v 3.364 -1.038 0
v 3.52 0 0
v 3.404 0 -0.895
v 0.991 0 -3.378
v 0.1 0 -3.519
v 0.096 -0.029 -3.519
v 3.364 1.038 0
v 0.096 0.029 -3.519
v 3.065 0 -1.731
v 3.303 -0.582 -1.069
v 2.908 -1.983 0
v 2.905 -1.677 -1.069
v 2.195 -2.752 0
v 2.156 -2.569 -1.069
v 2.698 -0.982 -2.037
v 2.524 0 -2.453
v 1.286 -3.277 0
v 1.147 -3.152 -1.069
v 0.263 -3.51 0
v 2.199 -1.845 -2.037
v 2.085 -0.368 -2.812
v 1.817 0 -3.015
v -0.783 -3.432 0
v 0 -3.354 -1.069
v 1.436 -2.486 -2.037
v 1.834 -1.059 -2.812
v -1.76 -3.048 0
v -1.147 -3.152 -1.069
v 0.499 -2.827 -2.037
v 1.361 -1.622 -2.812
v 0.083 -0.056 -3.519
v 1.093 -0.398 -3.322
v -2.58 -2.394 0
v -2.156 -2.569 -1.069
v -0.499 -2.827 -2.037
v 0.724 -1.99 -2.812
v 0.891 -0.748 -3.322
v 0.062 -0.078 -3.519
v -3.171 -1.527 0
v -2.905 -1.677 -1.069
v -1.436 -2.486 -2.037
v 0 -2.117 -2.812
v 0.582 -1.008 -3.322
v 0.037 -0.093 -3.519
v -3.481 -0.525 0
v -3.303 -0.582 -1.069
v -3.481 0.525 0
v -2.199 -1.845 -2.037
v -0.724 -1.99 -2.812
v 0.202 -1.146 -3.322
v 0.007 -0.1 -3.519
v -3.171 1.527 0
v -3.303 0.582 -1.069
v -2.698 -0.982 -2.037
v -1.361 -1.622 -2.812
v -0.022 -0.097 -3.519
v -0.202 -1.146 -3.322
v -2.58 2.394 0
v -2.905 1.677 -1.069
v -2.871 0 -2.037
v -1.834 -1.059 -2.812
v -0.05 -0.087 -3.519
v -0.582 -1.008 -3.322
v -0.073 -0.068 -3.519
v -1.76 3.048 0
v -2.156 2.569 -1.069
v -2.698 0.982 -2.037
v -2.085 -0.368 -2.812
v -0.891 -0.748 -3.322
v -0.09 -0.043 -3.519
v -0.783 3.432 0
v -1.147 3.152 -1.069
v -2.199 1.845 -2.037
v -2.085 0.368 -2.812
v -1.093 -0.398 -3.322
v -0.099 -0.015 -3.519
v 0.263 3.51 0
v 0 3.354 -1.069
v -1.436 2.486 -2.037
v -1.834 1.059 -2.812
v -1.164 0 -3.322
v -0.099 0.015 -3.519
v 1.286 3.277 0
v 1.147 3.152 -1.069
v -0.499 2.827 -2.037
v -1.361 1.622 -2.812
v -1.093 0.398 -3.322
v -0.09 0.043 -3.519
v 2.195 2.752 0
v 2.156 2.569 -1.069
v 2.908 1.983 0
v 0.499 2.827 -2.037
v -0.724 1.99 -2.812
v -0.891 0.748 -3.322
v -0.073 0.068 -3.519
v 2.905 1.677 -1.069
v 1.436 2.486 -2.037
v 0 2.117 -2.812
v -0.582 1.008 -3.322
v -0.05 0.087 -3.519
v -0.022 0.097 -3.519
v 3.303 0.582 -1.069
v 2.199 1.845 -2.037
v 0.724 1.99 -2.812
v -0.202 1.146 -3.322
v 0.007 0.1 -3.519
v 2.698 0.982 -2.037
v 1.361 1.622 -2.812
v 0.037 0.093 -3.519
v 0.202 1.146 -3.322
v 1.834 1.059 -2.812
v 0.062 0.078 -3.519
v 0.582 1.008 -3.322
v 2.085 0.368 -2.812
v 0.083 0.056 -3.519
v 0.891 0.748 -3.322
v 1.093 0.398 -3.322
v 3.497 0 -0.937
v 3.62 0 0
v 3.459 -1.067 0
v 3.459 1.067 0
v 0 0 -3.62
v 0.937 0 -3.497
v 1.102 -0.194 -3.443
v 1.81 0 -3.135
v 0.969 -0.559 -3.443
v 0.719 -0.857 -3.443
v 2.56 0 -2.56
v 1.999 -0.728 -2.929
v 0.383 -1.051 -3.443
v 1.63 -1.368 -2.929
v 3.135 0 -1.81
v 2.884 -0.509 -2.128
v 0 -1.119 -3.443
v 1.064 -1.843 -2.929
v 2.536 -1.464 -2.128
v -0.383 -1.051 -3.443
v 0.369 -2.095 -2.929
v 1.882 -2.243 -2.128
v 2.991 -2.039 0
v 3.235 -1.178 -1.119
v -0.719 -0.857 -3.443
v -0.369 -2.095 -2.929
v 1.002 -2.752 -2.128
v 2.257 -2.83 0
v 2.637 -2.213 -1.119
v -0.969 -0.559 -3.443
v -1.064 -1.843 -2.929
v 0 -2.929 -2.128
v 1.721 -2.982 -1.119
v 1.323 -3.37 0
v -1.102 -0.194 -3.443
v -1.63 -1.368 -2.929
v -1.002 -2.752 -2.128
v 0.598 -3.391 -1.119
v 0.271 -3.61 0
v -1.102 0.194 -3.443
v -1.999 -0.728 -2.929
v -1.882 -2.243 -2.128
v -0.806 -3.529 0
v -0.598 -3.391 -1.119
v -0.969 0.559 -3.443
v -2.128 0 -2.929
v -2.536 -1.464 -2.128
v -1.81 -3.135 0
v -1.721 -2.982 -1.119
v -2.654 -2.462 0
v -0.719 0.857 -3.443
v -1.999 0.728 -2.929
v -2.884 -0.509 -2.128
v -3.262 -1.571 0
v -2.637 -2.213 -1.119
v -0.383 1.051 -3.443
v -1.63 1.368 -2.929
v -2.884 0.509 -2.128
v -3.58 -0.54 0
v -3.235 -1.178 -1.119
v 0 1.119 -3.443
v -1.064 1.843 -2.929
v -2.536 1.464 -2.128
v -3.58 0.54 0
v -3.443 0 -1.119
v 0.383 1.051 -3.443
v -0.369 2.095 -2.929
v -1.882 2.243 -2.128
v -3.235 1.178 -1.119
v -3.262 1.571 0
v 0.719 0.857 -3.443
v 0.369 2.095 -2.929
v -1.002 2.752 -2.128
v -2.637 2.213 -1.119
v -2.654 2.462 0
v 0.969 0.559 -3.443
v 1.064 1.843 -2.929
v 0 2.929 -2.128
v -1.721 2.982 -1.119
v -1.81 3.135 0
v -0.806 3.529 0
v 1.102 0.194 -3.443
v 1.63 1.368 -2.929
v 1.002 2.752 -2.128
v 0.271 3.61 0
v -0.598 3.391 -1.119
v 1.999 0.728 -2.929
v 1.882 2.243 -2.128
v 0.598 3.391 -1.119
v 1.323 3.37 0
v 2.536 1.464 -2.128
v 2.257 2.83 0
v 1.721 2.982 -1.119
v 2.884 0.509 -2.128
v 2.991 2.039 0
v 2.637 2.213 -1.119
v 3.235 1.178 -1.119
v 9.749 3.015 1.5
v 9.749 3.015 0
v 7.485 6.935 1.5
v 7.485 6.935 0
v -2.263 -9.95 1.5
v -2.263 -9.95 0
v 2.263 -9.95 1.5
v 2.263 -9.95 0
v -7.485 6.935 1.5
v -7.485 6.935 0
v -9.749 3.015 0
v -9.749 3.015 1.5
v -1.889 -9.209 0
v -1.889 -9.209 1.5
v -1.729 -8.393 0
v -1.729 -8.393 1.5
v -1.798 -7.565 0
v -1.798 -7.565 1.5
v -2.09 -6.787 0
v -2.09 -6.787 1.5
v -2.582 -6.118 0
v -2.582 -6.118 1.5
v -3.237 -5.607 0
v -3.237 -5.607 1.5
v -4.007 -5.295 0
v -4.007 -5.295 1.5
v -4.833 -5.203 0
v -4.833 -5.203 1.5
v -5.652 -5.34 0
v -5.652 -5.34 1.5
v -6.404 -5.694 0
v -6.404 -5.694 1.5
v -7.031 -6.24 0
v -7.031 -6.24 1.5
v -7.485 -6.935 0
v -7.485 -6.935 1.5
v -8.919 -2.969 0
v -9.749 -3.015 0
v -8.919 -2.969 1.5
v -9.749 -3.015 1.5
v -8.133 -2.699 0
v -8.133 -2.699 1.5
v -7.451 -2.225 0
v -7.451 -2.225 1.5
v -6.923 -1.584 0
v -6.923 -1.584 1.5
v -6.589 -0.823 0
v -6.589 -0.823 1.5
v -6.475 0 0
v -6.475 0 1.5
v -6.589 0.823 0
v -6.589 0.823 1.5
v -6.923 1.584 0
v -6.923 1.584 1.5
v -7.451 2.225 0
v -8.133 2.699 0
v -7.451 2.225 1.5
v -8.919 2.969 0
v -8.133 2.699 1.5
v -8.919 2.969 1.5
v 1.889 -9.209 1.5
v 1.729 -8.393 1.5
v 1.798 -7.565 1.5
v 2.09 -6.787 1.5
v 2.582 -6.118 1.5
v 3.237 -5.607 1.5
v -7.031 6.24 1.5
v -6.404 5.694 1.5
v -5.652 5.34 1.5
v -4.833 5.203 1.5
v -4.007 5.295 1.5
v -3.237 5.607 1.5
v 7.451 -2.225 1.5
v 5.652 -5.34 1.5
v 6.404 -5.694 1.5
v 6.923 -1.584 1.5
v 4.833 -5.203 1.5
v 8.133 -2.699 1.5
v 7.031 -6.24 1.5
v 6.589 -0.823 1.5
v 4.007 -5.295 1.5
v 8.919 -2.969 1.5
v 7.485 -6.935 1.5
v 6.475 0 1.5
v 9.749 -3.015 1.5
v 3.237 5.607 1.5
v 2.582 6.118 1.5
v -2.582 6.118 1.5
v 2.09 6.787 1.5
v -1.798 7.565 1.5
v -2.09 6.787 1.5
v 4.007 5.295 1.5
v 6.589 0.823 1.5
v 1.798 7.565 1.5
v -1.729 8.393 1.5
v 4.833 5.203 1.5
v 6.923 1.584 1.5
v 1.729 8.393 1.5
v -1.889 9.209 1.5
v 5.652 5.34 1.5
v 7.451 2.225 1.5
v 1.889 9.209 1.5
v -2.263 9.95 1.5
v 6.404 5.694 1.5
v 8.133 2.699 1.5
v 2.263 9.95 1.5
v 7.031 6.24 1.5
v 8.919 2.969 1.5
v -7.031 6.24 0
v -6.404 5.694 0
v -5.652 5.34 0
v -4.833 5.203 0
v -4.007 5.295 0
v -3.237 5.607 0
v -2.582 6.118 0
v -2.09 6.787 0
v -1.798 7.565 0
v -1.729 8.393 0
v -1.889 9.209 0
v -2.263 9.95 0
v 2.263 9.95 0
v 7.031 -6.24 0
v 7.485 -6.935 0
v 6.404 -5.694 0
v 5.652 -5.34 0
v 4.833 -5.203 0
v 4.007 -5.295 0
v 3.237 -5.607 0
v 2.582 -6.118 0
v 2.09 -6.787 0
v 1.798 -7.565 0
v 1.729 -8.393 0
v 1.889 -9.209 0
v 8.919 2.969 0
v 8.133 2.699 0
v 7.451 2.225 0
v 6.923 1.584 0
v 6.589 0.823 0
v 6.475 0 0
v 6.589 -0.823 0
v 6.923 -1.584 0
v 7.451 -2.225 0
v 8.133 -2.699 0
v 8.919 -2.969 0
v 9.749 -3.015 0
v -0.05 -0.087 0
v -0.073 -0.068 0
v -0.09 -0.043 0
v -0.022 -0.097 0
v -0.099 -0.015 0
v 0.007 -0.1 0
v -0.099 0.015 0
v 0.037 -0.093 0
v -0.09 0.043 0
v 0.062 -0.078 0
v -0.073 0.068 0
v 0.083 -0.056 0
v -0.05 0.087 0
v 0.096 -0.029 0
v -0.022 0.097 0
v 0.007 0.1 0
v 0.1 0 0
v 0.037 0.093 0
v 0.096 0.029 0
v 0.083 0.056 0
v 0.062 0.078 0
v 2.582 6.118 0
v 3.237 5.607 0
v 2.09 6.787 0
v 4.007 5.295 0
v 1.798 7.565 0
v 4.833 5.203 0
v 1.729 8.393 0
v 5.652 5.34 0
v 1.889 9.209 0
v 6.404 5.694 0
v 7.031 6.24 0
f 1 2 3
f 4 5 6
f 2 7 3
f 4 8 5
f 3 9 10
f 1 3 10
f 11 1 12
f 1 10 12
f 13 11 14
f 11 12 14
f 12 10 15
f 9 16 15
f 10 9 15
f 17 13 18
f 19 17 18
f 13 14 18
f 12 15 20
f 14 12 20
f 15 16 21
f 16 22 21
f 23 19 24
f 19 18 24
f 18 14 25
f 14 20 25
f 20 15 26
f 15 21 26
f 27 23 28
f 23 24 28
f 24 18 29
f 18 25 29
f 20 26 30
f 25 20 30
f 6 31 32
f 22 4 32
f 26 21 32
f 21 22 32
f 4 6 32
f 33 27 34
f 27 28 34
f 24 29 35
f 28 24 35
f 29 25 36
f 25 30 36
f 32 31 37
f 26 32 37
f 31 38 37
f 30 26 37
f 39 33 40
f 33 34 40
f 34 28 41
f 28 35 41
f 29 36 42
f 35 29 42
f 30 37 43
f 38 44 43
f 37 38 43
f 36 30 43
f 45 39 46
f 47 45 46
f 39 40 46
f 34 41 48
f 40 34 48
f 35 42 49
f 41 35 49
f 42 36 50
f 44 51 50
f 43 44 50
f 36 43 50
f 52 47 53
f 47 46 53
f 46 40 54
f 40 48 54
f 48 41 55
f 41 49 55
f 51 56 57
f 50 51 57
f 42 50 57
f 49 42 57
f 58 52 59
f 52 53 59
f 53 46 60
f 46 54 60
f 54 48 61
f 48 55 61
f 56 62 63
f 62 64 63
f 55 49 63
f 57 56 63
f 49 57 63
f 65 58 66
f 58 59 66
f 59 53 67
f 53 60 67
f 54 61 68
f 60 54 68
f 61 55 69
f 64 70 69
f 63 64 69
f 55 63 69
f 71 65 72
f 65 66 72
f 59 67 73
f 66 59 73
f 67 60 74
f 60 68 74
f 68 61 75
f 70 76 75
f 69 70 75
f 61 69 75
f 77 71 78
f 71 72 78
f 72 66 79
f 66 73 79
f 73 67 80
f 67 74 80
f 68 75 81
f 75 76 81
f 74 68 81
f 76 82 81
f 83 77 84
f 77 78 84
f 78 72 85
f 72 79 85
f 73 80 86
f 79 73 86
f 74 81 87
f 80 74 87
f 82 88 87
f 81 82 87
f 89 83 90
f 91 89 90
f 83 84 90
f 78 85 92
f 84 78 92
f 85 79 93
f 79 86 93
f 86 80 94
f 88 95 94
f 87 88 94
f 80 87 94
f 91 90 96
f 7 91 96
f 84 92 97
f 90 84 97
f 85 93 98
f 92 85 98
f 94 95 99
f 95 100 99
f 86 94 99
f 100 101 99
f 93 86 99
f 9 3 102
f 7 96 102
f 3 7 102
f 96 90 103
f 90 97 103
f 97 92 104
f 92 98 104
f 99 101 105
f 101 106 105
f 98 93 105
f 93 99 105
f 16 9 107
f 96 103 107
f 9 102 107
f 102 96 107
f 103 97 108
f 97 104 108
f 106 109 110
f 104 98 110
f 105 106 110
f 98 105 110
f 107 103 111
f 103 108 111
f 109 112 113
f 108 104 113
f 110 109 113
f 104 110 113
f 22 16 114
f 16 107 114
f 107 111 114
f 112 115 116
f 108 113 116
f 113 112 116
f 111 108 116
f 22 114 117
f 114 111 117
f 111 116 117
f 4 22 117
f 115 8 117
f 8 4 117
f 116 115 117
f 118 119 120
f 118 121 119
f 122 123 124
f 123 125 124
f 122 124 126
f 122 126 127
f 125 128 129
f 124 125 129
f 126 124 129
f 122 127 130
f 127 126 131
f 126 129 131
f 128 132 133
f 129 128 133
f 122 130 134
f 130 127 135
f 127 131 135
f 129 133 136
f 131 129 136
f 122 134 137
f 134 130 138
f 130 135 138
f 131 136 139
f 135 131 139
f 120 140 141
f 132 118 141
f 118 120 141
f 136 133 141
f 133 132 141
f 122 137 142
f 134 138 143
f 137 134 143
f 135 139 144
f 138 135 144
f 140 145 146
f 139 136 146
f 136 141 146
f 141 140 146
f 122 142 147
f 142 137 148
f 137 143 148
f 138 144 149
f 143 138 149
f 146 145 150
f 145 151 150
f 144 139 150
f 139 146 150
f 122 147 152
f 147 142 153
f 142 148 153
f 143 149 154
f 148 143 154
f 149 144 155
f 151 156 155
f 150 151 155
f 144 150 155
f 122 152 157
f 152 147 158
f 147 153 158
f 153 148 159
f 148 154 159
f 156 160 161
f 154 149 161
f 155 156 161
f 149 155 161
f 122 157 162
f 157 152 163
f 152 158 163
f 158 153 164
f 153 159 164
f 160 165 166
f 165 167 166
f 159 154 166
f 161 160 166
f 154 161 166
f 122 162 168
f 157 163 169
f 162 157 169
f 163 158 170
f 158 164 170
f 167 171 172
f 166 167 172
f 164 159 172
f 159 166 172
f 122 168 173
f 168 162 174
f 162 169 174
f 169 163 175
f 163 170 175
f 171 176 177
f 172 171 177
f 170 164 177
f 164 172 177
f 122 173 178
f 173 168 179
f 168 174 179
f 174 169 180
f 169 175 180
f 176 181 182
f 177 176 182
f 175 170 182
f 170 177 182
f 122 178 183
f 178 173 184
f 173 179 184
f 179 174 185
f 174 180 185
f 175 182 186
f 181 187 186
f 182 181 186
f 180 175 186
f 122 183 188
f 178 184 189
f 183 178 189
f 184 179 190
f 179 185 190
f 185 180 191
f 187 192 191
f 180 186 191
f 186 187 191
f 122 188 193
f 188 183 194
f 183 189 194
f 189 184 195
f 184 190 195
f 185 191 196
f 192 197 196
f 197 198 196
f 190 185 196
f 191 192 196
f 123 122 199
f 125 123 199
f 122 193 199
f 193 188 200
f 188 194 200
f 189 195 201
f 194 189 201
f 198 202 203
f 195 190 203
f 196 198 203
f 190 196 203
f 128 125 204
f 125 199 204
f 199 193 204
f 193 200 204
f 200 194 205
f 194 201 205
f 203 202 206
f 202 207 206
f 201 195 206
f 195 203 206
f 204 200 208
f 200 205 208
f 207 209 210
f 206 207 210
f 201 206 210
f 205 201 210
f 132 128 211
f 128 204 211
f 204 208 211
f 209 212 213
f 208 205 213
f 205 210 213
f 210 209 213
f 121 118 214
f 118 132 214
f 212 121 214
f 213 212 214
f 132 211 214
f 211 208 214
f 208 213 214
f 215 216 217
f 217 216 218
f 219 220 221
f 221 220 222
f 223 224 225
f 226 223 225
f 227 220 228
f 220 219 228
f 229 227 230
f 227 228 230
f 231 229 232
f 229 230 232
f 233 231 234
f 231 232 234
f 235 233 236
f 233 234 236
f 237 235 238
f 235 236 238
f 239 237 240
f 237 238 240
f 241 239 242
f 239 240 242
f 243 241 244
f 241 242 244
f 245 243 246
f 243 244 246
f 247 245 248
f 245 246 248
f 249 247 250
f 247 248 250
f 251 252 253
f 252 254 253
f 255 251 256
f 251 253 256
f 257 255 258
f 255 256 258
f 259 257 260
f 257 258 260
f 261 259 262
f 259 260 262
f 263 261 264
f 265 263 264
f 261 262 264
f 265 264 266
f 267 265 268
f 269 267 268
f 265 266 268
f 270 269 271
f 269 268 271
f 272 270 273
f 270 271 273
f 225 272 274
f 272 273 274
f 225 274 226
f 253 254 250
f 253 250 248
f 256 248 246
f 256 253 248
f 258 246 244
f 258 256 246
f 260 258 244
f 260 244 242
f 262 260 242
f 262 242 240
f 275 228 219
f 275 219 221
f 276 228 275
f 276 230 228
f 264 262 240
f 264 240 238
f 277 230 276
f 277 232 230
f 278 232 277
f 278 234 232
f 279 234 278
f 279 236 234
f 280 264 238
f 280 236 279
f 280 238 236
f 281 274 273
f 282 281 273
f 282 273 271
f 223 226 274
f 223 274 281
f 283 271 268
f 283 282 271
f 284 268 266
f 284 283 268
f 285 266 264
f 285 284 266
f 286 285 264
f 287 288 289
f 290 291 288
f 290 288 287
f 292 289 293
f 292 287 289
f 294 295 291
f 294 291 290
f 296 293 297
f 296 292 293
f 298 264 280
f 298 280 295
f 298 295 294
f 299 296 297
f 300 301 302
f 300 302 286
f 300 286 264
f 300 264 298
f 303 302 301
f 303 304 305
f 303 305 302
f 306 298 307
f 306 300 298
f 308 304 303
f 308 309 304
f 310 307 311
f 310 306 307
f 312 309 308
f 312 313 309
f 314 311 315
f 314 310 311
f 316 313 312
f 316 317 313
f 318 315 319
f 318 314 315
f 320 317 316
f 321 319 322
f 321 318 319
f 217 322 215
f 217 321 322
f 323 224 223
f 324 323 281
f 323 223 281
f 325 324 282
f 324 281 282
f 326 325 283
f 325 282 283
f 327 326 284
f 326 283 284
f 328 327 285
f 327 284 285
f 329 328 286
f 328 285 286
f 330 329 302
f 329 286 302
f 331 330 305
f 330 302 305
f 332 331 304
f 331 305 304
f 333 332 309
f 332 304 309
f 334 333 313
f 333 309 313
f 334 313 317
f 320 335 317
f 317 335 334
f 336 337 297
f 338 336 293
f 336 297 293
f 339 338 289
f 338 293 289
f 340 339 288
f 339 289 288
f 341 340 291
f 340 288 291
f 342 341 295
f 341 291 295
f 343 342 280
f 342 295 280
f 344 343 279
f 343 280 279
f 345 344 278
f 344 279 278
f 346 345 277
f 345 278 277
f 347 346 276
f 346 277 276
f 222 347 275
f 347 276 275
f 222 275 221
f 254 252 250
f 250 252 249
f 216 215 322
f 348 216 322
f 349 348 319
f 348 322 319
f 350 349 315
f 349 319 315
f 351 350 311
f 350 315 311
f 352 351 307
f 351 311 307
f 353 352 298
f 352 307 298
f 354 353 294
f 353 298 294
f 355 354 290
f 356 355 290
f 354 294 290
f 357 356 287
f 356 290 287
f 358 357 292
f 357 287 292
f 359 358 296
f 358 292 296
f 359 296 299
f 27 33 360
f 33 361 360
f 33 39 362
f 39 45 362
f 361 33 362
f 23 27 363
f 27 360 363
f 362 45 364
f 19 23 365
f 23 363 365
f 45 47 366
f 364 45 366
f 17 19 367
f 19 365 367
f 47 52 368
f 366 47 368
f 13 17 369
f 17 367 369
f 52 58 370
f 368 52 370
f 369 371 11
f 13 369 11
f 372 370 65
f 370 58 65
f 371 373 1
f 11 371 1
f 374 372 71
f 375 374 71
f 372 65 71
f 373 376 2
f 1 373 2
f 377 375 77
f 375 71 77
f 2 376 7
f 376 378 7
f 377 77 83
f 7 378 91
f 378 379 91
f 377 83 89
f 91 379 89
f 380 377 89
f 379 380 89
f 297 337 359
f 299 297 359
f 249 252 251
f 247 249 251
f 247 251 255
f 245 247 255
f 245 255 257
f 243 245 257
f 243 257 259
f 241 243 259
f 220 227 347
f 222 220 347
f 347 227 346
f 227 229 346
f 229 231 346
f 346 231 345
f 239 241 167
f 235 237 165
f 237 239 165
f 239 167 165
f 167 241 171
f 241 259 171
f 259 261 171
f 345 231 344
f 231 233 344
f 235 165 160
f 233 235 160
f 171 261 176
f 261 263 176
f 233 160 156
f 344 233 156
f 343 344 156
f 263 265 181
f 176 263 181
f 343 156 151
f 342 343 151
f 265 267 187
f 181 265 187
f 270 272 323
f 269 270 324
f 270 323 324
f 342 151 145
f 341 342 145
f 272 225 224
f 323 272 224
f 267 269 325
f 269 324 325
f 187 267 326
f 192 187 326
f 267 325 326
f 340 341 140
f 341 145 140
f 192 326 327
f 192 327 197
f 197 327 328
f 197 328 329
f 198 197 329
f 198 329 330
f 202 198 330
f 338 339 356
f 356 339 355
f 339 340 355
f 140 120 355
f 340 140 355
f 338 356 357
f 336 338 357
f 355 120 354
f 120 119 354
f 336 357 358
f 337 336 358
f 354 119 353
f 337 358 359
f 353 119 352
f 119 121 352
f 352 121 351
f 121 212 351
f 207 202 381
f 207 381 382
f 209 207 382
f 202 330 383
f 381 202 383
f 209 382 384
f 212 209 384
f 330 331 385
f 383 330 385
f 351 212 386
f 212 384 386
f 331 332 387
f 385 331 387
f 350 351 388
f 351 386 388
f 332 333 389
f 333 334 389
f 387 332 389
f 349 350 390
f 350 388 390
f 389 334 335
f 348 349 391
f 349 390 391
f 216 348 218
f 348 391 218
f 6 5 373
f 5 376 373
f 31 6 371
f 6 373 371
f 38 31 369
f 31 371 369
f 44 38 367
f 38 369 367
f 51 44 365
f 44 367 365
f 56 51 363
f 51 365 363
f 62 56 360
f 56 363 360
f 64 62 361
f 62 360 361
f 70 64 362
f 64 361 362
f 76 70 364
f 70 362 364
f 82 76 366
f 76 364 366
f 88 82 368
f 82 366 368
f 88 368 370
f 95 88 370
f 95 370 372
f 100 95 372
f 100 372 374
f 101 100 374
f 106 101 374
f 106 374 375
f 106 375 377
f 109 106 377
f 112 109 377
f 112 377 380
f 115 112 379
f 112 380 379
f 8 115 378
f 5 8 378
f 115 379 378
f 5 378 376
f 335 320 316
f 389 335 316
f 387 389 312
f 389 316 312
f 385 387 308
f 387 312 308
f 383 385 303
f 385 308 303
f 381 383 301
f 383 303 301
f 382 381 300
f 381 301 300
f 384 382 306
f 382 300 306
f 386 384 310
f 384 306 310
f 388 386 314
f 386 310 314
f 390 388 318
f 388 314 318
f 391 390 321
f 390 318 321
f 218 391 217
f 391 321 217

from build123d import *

# Parameters (mm, degrees)
EXTRUDE_1_DEPTH     = 1.5
SKETCH_2_R          = 3.025074469
CUT_EXTRUDE_1_DEPTH = 16.272715323


with BuildPart() as part:
    # 草图1 → 凸台-拉伸1 (new body)
    with BuildSketch(Plane.XY):
        Polygon((11.489270357, 0), (5.744635178, 9.95), (-5.744635178, 9.95), (-11.489270357, 0), (-5.744635178, -9.95), (5.744635178, -9.95), align=None)
    extrude(amount=EXTRUDE_1_DEPTH)

    # 草图2 → 切除-拉伸1 (cut, through all)
    with BuildSketch(Plane.XY.offset(1.5)):
        with Locations((-9.5, 0)):
            Circle(SKETCH_2_R)
        with Locations((-4.75, 8.227241336)):
            Circle(SKETCH_2_R)
        with Locations((4.75, 8.227241336)):
            Circle(SKETCH_2_R)
        with Locations((9.5, 0)):
            Circle(SKETCH_2_R)
        with Locations((4.75, -8.227241336)):
            Circle(SKETCH_2_R)
        with Locations((-4.75, -8.227241336)):
            Circle(SKETCH_2_R)
    extrude(amount=-CUT_EXTRUDE_1_DEPTH, mode=Mode.SUBTRACT)

    # 草图4 → 旋转-薄壁2 (revolve)
    with BuildSketch(Plane(origin=(0, 0, 0), x_dir=(0, 0, -1), z_dir=(1, 0, 0)), mode=Mode.PRIVATE) as revolve_2_sk:
        with BuildLine():
            Line((0, 0), (3.62, 0))
            ThreePointArc((3.62, 0), (2.559726548, 2.559726548), (0, 3.62))
            Line((0, 3.62), (0, 3.52))
            ThreePointArc((0, 3.52), (2.453405796, 2.52412361), (3.518579259, 0.1))
            Line((3.518579259, 0.1), (0, 0.1))
            Line((0, 0.1), (0, 0))
        make_face()
    revolve(revolve_2_sk.sketch.rotate(Axis((0, 0, 0), (0, 0, -1)), 90), axis=Axis((0, 0, 0), (0, 0, -1)))


solid = part.part
